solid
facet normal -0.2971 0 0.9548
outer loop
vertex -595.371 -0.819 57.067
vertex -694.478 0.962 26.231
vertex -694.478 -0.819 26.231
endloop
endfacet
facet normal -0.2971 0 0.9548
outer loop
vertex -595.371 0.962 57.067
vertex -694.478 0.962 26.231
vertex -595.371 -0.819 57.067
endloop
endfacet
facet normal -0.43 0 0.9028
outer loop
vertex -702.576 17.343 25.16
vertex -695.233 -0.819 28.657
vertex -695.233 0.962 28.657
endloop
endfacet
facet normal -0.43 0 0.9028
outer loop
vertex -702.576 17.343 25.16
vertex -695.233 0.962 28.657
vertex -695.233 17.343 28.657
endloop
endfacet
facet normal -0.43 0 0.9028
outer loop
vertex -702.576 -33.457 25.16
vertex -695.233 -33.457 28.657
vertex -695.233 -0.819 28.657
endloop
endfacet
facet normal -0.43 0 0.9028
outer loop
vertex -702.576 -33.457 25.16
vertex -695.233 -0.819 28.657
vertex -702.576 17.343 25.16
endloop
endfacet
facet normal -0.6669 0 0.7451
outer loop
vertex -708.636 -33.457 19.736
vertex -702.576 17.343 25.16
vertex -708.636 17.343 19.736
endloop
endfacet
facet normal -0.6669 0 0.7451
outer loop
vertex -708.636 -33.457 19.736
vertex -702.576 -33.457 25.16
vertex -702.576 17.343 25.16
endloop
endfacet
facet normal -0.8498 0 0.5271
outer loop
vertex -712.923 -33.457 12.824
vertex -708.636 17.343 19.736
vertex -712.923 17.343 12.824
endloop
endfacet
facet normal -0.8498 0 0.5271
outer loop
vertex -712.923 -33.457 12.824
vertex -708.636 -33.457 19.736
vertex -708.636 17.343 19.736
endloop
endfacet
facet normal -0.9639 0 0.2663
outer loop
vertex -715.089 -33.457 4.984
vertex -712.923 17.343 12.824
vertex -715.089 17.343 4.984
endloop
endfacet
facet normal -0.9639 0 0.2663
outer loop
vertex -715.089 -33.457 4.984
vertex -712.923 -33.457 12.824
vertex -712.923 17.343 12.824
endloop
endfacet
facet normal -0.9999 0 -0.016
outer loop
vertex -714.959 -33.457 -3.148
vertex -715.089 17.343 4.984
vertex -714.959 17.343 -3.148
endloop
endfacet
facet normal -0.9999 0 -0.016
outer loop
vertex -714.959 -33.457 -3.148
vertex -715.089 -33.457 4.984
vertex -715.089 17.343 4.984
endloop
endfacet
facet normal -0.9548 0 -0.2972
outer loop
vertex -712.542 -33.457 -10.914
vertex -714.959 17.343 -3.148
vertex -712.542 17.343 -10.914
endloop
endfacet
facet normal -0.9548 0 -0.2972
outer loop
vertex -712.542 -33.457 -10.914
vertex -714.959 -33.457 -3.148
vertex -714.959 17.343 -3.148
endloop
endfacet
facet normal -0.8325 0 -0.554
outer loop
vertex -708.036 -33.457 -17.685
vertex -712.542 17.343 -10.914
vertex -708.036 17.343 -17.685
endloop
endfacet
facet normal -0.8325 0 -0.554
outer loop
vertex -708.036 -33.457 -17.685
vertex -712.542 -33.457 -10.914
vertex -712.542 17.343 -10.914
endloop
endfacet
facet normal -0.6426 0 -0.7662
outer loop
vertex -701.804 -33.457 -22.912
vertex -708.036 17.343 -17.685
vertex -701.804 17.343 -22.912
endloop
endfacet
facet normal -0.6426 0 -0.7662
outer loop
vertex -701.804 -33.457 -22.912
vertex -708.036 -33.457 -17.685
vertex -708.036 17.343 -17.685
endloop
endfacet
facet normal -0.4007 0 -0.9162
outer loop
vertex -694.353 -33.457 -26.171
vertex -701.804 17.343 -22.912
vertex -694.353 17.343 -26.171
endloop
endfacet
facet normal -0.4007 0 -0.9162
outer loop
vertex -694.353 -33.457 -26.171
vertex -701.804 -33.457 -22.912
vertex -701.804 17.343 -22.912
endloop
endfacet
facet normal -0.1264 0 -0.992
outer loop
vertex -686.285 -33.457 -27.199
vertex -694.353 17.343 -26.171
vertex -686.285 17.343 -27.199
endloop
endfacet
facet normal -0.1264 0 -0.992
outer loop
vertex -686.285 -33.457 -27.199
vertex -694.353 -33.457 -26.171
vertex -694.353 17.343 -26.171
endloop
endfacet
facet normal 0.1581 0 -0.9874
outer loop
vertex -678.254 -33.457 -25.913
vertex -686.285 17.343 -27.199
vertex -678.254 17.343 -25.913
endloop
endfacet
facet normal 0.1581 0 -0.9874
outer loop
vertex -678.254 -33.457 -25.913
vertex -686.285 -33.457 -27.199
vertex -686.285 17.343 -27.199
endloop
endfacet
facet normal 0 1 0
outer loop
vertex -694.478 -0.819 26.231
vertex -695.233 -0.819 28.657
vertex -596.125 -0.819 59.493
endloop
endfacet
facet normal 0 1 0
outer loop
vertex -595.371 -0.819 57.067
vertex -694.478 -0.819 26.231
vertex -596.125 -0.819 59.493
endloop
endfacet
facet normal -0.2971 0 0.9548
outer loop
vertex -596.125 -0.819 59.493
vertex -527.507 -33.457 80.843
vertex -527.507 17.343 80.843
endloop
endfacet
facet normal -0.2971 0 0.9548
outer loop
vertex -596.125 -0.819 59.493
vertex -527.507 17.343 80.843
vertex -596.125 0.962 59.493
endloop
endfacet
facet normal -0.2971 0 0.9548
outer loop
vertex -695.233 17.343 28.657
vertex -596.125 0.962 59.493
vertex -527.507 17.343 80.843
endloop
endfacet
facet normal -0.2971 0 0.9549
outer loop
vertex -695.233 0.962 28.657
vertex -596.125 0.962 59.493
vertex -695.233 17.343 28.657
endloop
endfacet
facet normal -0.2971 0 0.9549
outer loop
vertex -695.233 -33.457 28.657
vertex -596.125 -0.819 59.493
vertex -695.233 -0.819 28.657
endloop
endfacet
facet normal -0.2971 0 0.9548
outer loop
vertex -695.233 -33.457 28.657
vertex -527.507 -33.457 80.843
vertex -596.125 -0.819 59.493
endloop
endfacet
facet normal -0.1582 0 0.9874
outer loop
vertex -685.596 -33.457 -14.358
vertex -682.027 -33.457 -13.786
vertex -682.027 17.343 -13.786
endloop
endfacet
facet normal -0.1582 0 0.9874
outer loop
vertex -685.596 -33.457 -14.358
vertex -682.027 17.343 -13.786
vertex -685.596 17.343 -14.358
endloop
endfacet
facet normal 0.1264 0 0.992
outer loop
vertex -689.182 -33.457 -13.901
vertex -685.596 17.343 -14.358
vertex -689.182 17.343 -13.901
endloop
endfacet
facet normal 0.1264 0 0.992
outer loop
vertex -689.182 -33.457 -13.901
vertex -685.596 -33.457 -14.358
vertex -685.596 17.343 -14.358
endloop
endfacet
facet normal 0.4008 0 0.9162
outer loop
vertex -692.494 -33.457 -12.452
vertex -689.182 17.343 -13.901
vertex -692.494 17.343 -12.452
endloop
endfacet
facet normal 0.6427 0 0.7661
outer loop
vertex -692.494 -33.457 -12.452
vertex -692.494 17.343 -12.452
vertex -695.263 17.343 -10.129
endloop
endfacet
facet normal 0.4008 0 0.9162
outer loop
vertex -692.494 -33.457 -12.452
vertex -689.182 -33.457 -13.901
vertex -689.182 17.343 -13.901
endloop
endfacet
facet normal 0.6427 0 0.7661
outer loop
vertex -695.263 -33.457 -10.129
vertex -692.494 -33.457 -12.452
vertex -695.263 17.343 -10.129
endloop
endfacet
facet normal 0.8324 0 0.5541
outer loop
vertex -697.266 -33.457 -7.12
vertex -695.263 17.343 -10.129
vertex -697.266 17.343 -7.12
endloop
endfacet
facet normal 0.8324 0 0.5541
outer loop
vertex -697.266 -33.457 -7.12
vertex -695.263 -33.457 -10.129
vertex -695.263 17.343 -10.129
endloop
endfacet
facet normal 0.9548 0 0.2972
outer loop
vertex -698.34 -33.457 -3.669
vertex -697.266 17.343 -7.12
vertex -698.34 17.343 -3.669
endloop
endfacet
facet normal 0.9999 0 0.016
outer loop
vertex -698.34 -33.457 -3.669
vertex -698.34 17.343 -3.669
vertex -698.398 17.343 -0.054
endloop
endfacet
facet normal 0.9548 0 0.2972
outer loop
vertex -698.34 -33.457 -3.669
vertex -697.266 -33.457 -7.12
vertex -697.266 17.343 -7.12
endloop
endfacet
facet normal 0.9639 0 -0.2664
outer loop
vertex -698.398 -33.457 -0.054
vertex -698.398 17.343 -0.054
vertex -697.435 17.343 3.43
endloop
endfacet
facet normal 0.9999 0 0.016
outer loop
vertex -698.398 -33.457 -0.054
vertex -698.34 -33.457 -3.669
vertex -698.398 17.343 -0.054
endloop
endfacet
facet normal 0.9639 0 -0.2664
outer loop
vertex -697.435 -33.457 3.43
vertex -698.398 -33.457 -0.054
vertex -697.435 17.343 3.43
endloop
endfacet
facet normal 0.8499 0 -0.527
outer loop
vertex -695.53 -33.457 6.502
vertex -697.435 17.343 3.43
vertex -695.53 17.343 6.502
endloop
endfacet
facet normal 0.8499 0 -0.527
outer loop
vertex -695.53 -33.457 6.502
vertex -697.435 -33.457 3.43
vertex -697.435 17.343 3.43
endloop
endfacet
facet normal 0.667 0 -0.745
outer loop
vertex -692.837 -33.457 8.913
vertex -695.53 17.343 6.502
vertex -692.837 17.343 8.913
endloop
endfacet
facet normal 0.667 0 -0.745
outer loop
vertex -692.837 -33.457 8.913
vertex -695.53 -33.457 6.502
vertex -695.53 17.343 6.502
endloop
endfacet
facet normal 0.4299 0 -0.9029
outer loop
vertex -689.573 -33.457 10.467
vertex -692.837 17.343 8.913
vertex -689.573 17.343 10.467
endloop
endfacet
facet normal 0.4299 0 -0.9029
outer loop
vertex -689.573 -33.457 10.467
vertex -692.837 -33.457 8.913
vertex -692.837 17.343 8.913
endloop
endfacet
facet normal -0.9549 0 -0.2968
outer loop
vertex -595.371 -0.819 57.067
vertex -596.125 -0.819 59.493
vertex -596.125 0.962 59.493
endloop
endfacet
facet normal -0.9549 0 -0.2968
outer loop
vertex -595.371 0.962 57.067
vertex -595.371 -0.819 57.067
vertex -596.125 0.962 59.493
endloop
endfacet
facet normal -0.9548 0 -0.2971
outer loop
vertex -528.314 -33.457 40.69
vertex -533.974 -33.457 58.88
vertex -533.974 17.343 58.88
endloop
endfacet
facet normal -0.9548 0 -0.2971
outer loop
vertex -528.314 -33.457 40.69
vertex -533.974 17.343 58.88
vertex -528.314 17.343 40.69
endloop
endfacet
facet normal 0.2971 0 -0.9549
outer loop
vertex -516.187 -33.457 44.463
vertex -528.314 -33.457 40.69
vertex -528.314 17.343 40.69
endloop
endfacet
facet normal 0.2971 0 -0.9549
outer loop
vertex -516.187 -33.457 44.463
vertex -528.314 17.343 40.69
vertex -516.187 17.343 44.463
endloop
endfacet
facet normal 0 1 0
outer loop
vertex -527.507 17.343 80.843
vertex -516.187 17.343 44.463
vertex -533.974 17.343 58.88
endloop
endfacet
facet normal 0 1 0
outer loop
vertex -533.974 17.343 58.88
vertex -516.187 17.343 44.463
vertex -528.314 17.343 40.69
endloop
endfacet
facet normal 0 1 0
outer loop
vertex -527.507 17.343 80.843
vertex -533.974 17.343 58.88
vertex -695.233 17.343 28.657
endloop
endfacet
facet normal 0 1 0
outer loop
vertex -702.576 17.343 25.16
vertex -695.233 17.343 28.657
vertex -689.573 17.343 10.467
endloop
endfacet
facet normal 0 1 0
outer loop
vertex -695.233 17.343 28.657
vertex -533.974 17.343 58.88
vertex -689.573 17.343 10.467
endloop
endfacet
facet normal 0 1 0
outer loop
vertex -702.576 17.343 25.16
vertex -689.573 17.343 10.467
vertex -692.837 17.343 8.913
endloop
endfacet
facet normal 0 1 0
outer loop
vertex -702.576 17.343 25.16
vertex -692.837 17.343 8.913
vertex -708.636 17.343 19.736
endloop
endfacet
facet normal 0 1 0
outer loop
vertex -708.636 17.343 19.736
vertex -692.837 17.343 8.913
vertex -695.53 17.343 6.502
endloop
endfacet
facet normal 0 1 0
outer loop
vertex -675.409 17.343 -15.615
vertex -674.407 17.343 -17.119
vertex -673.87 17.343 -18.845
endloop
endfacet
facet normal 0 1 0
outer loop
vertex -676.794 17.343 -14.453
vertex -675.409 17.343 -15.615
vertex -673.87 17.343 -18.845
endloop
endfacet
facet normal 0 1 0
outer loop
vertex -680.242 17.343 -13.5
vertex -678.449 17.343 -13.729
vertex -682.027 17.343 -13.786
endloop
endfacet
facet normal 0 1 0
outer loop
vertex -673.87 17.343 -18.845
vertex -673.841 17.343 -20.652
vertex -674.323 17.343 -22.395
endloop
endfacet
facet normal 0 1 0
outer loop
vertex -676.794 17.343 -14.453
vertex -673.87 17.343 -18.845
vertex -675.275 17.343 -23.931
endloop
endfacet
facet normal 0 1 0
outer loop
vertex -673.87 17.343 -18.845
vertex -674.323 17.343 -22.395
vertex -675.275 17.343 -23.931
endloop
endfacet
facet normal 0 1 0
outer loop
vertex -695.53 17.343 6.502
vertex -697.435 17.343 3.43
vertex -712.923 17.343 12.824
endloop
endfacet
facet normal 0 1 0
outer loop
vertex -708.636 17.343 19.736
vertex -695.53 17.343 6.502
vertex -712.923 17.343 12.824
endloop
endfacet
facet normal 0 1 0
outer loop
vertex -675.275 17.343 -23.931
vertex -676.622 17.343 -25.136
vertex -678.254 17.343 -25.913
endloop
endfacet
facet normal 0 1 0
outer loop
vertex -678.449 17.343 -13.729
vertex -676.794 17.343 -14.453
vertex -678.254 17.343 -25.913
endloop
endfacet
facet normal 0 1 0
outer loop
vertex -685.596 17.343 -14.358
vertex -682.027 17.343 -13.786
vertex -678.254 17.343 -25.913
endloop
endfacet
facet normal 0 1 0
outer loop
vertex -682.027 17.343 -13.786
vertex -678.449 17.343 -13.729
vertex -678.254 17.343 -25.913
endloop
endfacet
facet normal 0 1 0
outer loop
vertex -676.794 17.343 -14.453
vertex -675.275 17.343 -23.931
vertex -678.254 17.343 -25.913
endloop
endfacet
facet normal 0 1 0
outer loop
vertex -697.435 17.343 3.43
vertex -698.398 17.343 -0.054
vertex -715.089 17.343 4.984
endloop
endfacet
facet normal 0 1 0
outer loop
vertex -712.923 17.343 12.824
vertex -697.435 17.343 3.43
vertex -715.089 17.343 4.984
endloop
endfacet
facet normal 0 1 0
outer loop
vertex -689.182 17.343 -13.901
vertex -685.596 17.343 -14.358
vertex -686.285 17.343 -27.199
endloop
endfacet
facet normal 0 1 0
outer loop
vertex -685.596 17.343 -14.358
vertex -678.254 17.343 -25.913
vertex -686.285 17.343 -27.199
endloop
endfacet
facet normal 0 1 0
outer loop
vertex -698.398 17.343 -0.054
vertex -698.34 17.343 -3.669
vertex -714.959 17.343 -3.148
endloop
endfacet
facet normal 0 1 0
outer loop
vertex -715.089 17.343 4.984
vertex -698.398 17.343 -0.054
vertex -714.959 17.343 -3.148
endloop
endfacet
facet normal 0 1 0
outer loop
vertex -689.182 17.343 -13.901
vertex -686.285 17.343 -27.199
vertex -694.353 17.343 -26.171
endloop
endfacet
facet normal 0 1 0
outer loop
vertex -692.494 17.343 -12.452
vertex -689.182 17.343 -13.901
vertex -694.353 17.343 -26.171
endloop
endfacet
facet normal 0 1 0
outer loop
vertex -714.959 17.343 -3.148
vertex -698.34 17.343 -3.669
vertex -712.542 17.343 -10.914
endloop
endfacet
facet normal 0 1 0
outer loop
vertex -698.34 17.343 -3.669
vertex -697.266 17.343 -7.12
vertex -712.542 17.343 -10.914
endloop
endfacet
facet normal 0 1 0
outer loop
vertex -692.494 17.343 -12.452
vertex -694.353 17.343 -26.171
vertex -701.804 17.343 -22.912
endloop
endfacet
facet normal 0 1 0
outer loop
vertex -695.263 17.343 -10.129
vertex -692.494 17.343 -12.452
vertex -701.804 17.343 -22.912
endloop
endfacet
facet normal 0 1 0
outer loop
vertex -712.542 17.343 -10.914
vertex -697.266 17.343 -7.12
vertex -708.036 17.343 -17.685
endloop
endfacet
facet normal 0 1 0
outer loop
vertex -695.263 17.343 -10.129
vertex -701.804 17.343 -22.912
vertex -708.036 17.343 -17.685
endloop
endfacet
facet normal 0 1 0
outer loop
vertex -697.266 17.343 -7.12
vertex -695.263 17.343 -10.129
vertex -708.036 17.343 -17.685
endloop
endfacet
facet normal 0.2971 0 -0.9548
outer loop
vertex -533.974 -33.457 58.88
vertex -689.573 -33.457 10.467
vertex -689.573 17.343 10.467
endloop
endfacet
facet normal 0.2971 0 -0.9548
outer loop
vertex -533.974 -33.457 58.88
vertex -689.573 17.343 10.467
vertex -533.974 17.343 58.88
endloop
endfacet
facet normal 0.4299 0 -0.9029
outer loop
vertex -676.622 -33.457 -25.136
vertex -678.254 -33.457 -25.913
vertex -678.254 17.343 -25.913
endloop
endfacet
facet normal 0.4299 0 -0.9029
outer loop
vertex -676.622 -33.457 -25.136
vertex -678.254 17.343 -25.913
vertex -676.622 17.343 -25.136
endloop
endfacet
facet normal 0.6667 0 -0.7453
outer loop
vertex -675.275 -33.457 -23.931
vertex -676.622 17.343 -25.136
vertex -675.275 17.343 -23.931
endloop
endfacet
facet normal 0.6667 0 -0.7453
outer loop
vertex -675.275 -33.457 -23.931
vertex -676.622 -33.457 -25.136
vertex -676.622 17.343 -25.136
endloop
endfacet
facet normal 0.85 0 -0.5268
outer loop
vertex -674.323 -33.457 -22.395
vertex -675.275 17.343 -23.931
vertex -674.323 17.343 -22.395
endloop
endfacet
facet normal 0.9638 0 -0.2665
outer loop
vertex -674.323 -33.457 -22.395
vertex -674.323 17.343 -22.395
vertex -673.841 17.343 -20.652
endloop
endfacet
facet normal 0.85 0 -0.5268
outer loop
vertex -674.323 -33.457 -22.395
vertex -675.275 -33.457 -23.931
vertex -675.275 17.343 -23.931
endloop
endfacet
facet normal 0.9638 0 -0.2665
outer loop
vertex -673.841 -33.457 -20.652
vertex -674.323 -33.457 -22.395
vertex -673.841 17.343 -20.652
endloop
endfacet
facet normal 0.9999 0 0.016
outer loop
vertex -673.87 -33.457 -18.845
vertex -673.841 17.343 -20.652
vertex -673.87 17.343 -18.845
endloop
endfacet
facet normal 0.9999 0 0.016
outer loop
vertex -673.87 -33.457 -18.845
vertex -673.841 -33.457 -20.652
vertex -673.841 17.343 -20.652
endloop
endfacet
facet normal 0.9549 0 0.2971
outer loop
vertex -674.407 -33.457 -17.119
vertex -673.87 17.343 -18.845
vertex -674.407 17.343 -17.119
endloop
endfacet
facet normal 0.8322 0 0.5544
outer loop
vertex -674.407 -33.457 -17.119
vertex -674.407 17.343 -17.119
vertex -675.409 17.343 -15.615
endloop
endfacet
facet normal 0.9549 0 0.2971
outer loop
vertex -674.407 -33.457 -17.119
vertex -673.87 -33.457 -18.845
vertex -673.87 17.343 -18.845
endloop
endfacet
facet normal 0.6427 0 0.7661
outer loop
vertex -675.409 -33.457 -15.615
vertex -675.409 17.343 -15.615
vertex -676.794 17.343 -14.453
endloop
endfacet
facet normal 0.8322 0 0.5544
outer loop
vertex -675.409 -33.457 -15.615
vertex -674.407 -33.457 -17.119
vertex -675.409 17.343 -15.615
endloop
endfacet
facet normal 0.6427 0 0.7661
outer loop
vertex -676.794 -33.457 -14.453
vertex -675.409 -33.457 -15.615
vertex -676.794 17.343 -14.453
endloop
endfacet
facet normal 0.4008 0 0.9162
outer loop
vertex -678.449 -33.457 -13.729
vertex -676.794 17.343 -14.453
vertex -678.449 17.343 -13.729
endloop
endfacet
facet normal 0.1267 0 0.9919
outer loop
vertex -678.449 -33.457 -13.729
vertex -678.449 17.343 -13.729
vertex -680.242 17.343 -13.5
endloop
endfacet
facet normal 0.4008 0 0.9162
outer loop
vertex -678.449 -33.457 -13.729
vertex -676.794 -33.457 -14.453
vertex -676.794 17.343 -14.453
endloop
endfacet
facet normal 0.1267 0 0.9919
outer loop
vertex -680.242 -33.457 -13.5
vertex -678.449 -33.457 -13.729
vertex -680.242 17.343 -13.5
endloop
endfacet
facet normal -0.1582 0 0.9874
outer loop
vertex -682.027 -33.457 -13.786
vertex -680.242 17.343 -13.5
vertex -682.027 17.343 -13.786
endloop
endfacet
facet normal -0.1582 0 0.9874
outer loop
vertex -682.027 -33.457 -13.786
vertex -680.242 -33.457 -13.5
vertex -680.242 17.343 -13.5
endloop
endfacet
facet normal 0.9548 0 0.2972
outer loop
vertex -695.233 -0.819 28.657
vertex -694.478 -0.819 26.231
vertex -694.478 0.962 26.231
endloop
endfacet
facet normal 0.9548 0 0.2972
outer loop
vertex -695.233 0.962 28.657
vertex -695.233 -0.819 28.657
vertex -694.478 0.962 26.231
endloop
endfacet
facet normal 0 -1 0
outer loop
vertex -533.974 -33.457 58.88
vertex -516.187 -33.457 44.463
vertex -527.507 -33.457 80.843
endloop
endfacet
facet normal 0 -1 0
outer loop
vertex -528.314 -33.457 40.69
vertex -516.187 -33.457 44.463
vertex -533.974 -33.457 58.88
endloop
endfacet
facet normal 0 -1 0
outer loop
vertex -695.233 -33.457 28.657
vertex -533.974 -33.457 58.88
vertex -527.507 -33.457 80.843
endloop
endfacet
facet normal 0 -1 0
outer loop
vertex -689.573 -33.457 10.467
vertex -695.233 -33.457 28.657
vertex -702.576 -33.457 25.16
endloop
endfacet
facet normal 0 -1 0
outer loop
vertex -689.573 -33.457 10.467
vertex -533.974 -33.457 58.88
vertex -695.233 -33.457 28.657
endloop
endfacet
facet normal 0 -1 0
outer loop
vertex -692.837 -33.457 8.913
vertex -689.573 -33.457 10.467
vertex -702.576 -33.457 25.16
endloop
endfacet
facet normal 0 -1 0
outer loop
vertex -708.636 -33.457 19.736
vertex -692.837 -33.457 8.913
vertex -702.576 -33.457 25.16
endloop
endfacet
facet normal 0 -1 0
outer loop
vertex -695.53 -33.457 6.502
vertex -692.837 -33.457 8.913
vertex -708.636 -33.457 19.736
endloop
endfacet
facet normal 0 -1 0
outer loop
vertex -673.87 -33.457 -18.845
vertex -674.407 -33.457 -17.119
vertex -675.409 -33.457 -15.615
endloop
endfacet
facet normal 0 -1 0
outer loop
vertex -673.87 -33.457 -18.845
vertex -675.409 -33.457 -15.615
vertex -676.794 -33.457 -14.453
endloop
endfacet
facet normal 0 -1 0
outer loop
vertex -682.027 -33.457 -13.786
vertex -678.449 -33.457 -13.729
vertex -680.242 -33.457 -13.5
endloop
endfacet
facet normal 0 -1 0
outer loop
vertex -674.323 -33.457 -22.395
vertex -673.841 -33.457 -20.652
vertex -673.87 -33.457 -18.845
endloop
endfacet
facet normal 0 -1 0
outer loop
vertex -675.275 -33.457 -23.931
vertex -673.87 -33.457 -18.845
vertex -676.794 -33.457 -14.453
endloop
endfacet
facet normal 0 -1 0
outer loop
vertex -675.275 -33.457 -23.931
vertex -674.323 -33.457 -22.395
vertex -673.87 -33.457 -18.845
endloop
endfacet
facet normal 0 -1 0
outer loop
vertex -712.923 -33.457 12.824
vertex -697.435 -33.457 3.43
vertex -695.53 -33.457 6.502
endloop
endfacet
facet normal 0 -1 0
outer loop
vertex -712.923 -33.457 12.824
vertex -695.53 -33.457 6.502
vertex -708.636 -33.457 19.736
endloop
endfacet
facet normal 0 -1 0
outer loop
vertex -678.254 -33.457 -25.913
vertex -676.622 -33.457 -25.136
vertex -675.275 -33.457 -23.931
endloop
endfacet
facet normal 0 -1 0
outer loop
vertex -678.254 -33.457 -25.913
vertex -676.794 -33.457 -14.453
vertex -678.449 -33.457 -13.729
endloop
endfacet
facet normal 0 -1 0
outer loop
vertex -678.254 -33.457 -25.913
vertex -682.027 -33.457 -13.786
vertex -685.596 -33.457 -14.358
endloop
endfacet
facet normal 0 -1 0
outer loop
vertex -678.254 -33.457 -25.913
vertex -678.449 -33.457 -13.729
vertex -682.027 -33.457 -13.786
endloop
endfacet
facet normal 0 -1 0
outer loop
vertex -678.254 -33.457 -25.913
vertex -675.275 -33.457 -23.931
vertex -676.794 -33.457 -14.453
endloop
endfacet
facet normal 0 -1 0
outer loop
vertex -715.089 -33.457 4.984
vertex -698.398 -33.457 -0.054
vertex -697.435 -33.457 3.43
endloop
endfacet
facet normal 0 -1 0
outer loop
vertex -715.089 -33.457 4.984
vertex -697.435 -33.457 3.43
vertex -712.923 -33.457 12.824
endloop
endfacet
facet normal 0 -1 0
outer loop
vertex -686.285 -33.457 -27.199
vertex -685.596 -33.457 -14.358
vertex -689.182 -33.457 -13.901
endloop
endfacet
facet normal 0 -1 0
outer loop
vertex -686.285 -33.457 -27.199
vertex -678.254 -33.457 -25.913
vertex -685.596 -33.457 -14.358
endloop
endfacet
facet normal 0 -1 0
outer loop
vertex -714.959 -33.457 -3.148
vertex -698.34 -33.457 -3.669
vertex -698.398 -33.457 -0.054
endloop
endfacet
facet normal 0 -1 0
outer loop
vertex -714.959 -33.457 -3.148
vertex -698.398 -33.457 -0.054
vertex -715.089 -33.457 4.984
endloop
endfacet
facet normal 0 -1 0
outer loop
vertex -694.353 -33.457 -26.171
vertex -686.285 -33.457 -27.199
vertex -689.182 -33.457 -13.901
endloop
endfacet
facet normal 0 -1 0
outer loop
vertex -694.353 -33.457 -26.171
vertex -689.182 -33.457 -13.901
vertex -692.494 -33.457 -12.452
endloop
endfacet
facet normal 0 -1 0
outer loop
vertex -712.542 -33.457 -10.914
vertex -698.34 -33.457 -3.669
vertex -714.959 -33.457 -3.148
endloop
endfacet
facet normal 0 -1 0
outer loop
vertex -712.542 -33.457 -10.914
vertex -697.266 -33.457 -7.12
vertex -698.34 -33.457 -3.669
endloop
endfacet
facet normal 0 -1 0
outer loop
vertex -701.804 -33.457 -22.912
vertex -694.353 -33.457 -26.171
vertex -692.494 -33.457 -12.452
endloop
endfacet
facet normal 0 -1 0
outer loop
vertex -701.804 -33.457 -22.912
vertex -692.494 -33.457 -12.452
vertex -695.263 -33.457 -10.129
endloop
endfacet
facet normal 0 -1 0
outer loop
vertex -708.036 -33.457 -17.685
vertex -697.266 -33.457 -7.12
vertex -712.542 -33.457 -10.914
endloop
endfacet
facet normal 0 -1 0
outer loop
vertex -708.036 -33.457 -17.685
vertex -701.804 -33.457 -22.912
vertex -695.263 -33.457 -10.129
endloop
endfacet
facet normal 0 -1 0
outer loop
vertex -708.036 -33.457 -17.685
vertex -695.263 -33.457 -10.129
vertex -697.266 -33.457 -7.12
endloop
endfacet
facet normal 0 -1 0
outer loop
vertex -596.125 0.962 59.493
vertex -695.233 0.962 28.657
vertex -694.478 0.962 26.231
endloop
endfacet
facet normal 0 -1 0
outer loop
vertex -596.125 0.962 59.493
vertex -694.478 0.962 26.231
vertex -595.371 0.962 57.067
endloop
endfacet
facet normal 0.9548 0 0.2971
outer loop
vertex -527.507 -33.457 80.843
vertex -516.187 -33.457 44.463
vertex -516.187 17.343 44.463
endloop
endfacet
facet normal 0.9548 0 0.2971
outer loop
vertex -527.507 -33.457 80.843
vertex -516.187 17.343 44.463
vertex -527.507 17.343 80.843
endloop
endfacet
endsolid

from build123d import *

# Parameters (mm, degrees)
BOSS_EXTRUDE1_DEPTH = 50.8
SKETCH3_W           = 103.793513641
SKETCH3_H           = 1.78121028
CUT_EXTRUDE1_DEPTH  = 2.54


with BuildPart() as part:
    # Sketch1 → Boss-Extrude1 (new body)
    with BuildSketch(Plane(origin=(0, -33.456799282, 0), x_dir=(1, 0, 0), z_dir=(0, 1, 0))):
        with BuildLine():
            Line((-527.50657757, -80.842567675), (-695.232596141, -28.656691245))
            ThreePointArc((-695.232596141, -28.656691245), (-714.028086723, 7.11747239), (-678.253923088, 25.912962972))
            ThreePointArc((-678.253923088, 25.912962972), (-674.077147403, 17.963148831), (-682.026961544, 13.786373146))
            ThreePointArc((-682.026961544, 13.786373146), (-697.926589826, 5.432821776), (-689.573038456, -10.466806506))
            Line((-689.573038456, -10.466806506), (-533.973609712, -58.87964448))
            Line((-533.973609712, -58.87964448), (-528.314052027, -40.689759741))
            Line((-528.314052027, -40.689759741), (-516.187462201, -44.462798197))
            Line((-516.187462201, -44.462798197), (-527.50657757, -80.842567675))
        make_face()
    extrude(amount=BOSS_EXTRUDE1_DEPTH)

    # Sketch3 → Cut-Extrude1 (cut)
    with BuildSketch(Plane(origin=(-69.492010407, 0, 223.348136035), x_dir=(0.9548495925978474, 0, 0.2970896422222171), z_dir=(-0.29708964222221707, 0, 0.9548495925978473))):
        with Locations((-603.432198215, 0.071200718)):
            Rectangle(SKETCH3_W, SKETCH3_H)
    extrude(amount=-CUT_EXTRUDE1_DEPTH, mode=Mode.SUBTRACT)


solid = part.part
